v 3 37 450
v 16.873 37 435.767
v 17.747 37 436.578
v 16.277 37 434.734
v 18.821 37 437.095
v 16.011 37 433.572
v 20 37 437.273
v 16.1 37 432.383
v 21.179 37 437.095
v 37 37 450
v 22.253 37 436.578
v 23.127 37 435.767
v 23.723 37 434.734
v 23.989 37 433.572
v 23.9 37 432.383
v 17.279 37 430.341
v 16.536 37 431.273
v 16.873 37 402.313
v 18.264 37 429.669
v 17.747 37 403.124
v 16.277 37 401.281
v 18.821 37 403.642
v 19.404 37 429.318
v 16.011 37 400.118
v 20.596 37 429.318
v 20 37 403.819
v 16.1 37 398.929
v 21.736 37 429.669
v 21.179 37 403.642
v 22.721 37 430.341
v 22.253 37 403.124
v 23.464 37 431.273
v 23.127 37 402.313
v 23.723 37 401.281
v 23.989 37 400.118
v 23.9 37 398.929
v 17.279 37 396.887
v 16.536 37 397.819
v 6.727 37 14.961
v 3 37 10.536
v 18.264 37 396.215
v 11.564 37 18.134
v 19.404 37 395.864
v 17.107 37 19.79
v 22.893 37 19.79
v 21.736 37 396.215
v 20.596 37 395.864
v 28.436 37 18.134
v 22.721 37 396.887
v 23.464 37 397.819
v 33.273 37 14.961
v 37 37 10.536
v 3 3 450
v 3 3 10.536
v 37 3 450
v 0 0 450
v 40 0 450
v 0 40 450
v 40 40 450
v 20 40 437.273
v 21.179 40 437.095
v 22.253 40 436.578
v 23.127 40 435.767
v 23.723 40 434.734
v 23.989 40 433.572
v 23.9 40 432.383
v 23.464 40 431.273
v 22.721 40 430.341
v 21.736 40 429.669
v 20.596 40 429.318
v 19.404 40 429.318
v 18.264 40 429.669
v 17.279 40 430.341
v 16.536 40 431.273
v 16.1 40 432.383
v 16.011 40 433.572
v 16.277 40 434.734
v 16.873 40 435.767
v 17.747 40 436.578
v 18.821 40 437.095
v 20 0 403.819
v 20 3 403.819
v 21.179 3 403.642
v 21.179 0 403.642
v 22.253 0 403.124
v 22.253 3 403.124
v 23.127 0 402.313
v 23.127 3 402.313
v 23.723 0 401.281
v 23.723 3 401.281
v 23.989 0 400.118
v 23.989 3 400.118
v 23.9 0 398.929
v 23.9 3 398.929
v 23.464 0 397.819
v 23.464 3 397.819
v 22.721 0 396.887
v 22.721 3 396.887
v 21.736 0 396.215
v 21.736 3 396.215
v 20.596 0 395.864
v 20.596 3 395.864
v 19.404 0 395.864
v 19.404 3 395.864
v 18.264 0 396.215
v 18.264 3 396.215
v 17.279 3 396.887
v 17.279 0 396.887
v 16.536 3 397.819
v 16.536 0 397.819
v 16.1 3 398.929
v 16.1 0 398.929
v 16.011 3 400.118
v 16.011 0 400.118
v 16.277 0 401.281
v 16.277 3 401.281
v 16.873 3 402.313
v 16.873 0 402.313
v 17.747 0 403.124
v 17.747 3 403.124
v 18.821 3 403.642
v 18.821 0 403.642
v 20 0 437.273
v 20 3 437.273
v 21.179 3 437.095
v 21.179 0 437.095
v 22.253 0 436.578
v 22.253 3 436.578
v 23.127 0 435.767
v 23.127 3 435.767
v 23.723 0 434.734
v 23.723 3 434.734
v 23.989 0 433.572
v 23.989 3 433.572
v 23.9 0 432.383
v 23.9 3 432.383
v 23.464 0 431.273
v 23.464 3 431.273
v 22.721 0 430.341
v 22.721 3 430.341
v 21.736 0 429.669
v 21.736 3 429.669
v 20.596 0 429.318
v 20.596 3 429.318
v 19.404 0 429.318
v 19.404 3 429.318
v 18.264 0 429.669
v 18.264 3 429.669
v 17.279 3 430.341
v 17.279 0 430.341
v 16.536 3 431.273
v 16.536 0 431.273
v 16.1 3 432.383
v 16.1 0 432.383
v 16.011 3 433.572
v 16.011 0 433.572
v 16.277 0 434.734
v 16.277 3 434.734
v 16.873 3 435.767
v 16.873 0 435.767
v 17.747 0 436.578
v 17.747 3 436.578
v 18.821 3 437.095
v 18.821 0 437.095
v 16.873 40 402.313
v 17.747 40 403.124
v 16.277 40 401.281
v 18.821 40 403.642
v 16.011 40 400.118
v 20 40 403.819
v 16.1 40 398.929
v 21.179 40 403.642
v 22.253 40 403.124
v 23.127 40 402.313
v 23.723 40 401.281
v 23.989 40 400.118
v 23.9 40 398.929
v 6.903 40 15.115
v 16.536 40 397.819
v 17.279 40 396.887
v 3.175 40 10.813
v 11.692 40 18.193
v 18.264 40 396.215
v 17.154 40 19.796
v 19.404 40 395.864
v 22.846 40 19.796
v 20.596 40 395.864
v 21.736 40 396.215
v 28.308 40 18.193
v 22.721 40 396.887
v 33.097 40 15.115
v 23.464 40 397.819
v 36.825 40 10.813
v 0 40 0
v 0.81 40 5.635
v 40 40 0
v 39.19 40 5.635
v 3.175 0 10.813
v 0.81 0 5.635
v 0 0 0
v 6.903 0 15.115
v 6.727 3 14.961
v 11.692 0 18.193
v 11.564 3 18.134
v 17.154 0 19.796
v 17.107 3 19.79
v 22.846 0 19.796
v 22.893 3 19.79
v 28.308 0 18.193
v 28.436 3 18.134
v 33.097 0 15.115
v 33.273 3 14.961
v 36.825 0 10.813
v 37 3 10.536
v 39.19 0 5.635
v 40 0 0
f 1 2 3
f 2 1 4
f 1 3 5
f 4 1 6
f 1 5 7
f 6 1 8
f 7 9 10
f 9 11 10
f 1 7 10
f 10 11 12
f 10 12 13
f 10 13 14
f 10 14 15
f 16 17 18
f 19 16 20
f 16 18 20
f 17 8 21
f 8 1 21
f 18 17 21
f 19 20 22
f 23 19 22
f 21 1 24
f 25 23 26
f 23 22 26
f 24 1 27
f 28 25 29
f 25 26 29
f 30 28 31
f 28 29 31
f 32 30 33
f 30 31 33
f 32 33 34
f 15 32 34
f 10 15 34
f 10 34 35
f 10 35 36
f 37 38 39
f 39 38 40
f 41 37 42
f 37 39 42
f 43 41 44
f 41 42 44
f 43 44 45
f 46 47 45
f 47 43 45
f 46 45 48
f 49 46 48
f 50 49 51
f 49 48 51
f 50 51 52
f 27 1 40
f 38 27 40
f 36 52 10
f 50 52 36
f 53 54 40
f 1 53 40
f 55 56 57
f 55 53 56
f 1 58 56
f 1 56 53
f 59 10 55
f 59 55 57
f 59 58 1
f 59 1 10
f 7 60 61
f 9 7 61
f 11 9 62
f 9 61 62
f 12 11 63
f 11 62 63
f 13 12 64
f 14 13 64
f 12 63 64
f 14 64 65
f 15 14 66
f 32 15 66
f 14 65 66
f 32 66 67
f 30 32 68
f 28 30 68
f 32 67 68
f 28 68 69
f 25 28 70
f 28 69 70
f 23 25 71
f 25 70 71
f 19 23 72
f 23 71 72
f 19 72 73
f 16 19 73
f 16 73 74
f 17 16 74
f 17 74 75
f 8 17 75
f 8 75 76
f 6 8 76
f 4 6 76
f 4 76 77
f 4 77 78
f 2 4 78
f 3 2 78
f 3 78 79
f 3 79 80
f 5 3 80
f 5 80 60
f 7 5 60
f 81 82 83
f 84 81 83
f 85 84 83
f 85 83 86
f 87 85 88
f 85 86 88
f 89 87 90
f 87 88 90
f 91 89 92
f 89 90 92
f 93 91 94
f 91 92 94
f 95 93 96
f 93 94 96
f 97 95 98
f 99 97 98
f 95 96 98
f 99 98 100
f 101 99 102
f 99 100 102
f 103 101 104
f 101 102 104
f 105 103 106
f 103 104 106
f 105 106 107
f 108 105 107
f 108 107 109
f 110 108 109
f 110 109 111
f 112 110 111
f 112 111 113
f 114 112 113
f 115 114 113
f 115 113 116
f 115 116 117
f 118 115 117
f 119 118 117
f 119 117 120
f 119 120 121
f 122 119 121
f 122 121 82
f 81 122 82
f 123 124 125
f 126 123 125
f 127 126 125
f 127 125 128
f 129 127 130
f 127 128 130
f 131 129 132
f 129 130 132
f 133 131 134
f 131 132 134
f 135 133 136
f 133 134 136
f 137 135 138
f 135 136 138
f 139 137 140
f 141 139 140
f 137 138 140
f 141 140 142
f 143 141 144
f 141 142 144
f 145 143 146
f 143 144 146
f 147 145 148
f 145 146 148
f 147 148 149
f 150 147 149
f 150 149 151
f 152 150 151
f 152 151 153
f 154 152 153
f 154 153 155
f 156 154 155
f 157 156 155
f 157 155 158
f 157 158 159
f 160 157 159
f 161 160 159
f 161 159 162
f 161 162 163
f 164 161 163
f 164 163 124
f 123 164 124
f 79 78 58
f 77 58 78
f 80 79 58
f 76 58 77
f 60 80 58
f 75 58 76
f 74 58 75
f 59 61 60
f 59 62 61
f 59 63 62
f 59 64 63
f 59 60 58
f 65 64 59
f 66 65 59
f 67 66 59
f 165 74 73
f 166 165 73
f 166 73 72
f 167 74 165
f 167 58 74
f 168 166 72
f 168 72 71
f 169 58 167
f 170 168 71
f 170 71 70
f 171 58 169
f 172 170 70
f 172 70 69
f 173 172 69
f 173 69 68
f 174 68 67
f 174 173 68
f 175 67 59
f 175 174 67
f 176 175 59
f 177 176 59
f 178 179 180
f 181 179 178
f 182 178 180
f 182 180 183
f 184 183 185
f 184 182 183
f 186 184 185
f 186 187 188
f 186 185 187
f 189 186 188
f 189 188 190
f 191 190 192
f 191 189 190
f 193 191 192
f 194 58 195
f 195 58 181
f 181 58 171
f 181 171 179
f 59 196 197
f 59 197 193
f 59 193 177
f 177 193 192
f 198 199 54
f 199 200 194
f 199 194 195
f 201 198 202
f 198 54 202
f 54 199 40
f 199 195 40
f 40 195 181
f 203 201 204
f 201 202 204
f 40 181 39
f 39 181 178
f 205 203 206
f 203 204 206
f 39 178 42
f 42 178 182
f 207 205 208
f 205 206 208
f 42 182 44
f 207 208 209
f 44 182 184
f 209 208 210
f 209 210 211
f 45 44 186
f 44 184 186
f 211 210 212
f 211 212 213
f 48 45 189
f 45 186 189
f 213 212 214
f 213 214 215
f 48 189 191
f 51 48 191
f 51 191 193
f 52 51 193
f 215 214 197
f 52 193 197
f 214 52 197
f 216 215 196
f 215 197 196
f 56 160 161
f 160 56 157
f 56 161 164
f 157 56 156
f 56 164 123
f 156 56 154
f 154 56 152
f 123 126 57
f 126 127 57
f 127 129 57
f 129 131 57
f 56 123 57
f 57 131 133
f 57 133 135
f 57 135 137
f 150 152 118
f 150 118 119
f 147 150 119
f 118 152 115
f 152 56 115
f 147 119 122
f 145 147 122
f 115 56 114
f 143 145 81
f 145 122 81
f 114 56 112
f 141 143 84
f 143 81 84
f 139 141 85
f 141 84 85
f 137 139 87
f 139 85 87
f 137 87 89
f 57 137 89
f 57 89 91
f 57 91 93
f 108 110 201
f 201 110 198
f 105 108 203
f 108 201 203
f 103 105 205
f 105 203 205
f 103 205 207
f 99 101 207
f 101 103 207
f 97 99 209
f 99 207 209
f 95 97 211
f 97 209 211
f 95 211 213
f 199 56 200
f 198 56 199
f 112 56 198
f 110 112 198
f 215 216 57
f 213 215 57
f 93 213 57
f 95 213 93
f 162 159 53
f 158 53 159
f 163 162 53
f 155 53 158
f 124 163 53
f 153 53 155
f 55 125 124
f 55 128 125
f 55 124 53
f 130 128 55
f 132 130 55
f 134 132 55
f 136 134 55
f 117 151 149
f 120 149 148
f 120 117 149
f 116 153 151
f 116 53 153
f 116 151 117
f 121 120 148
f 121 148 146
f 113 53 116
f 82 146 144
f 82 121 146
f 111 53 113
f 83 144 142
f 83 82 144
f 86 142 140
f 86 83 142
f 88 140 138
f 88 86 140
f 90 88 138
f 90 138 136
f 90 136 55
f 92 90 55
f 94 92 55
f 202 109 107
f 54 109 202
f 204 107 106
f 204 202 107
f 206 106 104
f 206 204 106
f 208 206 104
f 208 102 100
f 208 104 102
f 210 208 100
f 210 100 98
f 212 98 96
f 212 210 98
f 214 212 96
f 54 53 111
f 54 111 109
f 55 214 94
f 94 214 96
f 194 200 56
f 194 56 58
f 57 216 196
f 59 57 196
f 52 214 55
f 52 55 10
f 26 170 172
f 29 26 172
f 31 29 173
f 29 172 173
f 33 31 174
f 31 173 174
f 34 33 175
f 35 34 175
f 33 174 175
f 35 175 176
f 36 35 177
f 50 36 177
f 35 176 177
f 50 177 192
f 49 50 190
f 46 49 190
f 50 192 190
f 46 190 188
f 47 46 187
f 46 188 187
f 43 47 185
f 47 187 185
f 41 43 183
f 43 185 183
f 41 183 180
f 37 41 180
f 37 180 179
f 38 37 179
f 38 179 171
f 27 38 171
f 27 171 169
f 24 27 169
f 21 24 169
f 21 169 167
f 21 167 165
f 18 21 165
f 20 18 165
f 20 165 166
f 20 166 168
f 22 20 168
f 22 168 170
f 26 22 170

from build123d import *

# Parameters (mm, degrees)
SKETCH1_W           = 40
SKETCH1_H           = 40
SKETCH1_W_2         = 34
SKETCH1_H_2         = 34
BOSS_EXTRUDE1_DEPTH = 450
SKETCH2_R           = 4
SKETCH2_R_2         = 20
CUT_EXTRUDE1_DEPTH  = 600


with BuildPart() as part:
    # Sketch1 → Boss-Extrude1 (new body)
    with BuildSketch(Plane.XY):
        with Locations((20, 20)):
            Rectangle(SKETCH1_W, SKETCH1_H)
        with Locations((20, 20)):
            Rectangle(SKETCH1_W_2, SKETCH1_H_2, mode=Mode.SUBTRACT)
    extrude(amount=BOSS_EXTRUDE1_DEPTH)

    # Sketch2 → Cut-Extrude1 (cut)
    with BuildSketch(Plane(origin=(0, 40, 0), x_dir=(1, 0, 0), z_dir=(0, 1, 0))):
        with Locations(Location((20, -399.819329365, 0), (0, 0, 270))):
            Circle(SKETCH2_R)
        with Locations(Location((20, -433.273109788, 0), (0, 0, 270))):
            Circle(SKETCH2_R)
        with Locations((20, 0)):
            Circle(SKETCH2_R_2)
    extrude(amount=-CUT_EXTRUDE1_DEPTH, mode=Mode.SUBTRACT)


solid = part.part
